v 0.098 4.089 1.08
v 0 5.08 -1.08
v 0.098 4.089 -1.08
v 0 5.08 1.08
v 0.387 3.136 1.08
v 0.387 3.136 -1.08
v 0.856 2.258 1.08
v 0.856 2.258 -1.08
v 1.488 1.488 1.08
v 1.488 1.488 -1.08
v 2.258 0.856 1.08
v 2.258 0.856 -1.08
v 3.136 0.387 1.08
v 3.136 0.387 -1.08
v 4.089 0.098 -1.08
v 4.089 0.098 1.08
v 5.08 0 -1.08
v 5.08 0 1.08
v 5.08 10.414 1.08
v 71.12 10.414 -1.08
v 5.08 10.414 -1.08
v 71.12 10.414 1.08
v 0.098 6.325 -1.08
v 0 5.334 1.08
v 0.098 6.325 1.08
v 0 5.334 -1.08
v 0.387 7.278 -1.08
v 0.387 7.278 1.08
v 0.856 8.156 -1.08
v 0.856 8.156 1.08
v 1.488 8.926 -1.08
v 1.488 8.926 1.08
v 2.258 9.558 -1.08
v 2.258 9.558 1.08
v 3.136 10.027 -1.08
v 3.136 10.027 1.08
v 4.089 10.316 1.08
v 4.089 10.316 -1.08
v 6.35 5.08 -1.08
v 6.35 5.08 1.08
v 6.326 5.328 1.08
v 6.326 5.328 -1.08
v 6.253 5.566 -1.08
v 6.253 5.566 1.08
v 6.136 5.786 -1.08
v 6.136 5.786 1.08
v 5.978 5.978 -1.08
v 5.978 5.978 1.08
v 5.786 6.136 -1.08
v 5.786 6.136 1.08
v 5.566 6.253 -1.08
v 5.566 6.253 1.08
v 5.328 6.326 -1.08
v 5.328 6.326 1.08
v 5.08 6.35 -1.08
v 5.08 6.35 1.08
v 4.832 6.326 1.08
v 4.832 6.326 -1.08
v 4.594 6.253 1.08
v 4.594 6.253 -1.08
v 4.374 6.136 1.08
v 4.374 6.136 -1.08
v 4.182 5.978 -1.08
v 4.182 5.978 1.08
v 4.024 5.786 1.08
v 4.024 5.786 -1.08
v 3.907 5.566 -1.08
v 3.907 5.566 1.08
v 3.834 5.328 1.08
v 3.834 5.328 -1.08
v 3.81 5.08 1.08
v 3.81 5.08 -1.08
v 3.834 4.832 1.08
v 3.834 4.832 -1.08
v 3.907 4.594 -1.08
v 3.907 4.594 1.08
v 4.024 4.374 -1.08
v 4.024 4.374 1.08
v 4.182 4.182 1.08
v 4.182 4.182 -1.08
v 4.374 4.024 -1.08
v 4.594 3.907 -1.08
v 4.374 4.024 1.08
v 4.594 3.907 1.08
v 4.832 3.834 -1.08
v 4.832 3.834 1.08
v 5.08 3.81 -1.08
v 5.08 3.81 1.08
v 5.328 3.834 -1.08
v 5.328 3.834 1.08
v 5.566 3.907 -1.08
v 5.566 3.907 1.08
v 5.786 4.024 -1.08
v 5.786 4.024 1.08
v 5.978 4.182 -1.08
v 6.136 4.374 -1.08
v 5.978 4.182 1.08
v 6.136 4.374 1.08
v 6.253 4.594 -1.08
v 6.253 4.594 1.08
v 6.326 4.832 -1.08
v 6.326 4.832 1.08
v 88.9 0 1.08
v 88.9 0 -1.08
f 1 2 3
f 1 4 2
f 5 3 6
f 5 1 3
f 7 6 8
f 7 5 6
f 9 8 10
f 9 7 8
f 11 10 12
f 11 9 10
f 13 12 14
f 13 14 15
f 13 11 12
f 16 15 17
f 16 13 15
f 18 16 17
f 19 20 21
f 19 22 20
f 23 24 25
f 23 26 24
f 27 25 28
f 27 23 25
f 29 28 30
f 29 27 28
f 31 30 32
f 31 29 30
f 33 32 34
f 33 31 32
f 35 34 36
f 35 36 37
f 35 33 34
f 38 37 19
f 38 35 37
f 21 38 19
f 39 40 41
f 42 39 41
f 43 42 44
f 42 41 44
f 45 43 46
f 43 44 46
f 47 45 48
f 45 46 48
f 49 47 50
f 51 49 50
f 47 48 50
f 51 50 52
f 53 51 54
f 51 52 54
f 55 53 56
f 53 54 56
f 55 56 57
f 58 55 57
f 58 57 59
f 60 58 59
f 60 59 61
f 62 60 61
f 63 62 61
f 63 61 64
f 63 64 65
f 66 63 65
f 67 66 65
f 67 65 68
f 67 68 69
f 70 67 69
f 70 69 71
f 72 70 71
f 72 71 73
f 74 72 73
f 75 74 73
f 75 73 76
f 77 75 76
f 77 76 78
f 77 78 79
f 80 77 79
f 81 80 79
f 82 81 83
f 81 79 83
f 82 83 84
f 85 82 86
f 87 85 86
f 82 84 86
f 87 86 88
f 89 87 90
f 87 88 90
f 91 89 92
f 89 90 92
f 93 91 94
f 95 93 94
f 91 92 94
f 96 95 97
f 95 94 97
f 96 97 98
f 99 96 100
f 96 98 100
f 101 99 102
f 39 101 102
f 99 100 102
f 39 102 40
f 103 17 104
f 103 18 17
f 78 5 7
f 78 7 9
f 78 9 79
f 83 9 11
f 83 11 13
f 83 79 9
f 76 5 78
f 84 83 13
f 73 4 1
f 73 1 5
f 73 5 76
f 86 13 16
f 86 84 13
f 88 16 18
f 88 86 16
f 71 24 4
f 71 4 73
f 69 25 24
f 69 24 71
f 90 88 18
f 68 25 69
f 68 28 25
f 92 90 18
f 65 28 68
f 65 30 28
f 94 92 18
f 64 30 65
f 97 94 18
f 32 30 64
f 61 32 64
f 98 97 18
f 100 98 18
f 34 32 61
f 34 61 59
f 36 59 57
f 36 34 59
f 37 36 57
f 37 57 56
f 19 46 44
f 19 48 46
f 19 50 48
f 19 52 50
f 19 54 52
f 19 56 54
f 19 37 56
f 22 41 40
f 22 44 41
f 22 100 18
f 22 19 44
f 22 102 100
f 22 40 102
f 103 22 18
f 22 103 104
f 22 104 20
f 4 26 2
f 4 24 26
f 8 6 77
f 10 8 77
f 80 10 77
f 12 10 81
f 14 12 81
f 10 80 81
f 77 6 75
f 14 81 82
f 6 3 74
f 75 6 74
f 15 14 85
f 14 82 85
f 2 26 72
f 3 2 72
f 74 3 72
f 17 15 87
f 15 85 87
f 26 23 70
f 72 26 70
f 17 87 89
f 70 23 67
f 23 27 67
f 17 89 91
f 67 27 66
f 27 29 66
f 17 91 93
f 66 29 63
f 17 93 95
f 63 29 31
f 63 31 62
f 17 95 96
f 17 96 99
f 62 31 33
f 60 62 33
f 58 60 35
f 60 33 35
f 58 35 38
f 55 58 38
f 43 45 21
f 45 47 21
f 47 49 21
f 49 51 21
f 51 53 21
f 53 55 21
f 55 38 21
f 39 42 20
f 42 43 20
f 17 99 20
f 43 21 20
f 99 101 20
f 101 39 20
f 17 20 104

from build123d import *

# Parameters (mm, degrees)
F1_DEPTH = 1.0795
F2_R     = 5.08
F3_R     = 1.27
F4_DEPTH = 25.4


with BuildPart() as f1:
    # F0 (on Top) → F1 (new body, symmetric)
    with BuildSketch(Plane.XY):
        Polygon((0, 10.414), (0, 0), (88.9, 0), (71.12, 10.414), align=None)
    extrude(amount=F1_DEPTH, both=True)

    # F2
    f2_edges = [f1.edges().sort_by_distance(p)[0] for p in [
        (0, 10.414, 0),
        (0, 0, 0),
    ]]
    fillet(f2_edges, radius=F2_R)

    # F3 (on face) → F4 (cut)
    with BuildSketch(Plane.XY.offset(1.0795)):
        with Locations((5.08, 5.08)):
            Circle(F3_R)
    extrude(amount=-F4_DEPTH, mode=Mode.SUBTRACT)


solid = f1.part
